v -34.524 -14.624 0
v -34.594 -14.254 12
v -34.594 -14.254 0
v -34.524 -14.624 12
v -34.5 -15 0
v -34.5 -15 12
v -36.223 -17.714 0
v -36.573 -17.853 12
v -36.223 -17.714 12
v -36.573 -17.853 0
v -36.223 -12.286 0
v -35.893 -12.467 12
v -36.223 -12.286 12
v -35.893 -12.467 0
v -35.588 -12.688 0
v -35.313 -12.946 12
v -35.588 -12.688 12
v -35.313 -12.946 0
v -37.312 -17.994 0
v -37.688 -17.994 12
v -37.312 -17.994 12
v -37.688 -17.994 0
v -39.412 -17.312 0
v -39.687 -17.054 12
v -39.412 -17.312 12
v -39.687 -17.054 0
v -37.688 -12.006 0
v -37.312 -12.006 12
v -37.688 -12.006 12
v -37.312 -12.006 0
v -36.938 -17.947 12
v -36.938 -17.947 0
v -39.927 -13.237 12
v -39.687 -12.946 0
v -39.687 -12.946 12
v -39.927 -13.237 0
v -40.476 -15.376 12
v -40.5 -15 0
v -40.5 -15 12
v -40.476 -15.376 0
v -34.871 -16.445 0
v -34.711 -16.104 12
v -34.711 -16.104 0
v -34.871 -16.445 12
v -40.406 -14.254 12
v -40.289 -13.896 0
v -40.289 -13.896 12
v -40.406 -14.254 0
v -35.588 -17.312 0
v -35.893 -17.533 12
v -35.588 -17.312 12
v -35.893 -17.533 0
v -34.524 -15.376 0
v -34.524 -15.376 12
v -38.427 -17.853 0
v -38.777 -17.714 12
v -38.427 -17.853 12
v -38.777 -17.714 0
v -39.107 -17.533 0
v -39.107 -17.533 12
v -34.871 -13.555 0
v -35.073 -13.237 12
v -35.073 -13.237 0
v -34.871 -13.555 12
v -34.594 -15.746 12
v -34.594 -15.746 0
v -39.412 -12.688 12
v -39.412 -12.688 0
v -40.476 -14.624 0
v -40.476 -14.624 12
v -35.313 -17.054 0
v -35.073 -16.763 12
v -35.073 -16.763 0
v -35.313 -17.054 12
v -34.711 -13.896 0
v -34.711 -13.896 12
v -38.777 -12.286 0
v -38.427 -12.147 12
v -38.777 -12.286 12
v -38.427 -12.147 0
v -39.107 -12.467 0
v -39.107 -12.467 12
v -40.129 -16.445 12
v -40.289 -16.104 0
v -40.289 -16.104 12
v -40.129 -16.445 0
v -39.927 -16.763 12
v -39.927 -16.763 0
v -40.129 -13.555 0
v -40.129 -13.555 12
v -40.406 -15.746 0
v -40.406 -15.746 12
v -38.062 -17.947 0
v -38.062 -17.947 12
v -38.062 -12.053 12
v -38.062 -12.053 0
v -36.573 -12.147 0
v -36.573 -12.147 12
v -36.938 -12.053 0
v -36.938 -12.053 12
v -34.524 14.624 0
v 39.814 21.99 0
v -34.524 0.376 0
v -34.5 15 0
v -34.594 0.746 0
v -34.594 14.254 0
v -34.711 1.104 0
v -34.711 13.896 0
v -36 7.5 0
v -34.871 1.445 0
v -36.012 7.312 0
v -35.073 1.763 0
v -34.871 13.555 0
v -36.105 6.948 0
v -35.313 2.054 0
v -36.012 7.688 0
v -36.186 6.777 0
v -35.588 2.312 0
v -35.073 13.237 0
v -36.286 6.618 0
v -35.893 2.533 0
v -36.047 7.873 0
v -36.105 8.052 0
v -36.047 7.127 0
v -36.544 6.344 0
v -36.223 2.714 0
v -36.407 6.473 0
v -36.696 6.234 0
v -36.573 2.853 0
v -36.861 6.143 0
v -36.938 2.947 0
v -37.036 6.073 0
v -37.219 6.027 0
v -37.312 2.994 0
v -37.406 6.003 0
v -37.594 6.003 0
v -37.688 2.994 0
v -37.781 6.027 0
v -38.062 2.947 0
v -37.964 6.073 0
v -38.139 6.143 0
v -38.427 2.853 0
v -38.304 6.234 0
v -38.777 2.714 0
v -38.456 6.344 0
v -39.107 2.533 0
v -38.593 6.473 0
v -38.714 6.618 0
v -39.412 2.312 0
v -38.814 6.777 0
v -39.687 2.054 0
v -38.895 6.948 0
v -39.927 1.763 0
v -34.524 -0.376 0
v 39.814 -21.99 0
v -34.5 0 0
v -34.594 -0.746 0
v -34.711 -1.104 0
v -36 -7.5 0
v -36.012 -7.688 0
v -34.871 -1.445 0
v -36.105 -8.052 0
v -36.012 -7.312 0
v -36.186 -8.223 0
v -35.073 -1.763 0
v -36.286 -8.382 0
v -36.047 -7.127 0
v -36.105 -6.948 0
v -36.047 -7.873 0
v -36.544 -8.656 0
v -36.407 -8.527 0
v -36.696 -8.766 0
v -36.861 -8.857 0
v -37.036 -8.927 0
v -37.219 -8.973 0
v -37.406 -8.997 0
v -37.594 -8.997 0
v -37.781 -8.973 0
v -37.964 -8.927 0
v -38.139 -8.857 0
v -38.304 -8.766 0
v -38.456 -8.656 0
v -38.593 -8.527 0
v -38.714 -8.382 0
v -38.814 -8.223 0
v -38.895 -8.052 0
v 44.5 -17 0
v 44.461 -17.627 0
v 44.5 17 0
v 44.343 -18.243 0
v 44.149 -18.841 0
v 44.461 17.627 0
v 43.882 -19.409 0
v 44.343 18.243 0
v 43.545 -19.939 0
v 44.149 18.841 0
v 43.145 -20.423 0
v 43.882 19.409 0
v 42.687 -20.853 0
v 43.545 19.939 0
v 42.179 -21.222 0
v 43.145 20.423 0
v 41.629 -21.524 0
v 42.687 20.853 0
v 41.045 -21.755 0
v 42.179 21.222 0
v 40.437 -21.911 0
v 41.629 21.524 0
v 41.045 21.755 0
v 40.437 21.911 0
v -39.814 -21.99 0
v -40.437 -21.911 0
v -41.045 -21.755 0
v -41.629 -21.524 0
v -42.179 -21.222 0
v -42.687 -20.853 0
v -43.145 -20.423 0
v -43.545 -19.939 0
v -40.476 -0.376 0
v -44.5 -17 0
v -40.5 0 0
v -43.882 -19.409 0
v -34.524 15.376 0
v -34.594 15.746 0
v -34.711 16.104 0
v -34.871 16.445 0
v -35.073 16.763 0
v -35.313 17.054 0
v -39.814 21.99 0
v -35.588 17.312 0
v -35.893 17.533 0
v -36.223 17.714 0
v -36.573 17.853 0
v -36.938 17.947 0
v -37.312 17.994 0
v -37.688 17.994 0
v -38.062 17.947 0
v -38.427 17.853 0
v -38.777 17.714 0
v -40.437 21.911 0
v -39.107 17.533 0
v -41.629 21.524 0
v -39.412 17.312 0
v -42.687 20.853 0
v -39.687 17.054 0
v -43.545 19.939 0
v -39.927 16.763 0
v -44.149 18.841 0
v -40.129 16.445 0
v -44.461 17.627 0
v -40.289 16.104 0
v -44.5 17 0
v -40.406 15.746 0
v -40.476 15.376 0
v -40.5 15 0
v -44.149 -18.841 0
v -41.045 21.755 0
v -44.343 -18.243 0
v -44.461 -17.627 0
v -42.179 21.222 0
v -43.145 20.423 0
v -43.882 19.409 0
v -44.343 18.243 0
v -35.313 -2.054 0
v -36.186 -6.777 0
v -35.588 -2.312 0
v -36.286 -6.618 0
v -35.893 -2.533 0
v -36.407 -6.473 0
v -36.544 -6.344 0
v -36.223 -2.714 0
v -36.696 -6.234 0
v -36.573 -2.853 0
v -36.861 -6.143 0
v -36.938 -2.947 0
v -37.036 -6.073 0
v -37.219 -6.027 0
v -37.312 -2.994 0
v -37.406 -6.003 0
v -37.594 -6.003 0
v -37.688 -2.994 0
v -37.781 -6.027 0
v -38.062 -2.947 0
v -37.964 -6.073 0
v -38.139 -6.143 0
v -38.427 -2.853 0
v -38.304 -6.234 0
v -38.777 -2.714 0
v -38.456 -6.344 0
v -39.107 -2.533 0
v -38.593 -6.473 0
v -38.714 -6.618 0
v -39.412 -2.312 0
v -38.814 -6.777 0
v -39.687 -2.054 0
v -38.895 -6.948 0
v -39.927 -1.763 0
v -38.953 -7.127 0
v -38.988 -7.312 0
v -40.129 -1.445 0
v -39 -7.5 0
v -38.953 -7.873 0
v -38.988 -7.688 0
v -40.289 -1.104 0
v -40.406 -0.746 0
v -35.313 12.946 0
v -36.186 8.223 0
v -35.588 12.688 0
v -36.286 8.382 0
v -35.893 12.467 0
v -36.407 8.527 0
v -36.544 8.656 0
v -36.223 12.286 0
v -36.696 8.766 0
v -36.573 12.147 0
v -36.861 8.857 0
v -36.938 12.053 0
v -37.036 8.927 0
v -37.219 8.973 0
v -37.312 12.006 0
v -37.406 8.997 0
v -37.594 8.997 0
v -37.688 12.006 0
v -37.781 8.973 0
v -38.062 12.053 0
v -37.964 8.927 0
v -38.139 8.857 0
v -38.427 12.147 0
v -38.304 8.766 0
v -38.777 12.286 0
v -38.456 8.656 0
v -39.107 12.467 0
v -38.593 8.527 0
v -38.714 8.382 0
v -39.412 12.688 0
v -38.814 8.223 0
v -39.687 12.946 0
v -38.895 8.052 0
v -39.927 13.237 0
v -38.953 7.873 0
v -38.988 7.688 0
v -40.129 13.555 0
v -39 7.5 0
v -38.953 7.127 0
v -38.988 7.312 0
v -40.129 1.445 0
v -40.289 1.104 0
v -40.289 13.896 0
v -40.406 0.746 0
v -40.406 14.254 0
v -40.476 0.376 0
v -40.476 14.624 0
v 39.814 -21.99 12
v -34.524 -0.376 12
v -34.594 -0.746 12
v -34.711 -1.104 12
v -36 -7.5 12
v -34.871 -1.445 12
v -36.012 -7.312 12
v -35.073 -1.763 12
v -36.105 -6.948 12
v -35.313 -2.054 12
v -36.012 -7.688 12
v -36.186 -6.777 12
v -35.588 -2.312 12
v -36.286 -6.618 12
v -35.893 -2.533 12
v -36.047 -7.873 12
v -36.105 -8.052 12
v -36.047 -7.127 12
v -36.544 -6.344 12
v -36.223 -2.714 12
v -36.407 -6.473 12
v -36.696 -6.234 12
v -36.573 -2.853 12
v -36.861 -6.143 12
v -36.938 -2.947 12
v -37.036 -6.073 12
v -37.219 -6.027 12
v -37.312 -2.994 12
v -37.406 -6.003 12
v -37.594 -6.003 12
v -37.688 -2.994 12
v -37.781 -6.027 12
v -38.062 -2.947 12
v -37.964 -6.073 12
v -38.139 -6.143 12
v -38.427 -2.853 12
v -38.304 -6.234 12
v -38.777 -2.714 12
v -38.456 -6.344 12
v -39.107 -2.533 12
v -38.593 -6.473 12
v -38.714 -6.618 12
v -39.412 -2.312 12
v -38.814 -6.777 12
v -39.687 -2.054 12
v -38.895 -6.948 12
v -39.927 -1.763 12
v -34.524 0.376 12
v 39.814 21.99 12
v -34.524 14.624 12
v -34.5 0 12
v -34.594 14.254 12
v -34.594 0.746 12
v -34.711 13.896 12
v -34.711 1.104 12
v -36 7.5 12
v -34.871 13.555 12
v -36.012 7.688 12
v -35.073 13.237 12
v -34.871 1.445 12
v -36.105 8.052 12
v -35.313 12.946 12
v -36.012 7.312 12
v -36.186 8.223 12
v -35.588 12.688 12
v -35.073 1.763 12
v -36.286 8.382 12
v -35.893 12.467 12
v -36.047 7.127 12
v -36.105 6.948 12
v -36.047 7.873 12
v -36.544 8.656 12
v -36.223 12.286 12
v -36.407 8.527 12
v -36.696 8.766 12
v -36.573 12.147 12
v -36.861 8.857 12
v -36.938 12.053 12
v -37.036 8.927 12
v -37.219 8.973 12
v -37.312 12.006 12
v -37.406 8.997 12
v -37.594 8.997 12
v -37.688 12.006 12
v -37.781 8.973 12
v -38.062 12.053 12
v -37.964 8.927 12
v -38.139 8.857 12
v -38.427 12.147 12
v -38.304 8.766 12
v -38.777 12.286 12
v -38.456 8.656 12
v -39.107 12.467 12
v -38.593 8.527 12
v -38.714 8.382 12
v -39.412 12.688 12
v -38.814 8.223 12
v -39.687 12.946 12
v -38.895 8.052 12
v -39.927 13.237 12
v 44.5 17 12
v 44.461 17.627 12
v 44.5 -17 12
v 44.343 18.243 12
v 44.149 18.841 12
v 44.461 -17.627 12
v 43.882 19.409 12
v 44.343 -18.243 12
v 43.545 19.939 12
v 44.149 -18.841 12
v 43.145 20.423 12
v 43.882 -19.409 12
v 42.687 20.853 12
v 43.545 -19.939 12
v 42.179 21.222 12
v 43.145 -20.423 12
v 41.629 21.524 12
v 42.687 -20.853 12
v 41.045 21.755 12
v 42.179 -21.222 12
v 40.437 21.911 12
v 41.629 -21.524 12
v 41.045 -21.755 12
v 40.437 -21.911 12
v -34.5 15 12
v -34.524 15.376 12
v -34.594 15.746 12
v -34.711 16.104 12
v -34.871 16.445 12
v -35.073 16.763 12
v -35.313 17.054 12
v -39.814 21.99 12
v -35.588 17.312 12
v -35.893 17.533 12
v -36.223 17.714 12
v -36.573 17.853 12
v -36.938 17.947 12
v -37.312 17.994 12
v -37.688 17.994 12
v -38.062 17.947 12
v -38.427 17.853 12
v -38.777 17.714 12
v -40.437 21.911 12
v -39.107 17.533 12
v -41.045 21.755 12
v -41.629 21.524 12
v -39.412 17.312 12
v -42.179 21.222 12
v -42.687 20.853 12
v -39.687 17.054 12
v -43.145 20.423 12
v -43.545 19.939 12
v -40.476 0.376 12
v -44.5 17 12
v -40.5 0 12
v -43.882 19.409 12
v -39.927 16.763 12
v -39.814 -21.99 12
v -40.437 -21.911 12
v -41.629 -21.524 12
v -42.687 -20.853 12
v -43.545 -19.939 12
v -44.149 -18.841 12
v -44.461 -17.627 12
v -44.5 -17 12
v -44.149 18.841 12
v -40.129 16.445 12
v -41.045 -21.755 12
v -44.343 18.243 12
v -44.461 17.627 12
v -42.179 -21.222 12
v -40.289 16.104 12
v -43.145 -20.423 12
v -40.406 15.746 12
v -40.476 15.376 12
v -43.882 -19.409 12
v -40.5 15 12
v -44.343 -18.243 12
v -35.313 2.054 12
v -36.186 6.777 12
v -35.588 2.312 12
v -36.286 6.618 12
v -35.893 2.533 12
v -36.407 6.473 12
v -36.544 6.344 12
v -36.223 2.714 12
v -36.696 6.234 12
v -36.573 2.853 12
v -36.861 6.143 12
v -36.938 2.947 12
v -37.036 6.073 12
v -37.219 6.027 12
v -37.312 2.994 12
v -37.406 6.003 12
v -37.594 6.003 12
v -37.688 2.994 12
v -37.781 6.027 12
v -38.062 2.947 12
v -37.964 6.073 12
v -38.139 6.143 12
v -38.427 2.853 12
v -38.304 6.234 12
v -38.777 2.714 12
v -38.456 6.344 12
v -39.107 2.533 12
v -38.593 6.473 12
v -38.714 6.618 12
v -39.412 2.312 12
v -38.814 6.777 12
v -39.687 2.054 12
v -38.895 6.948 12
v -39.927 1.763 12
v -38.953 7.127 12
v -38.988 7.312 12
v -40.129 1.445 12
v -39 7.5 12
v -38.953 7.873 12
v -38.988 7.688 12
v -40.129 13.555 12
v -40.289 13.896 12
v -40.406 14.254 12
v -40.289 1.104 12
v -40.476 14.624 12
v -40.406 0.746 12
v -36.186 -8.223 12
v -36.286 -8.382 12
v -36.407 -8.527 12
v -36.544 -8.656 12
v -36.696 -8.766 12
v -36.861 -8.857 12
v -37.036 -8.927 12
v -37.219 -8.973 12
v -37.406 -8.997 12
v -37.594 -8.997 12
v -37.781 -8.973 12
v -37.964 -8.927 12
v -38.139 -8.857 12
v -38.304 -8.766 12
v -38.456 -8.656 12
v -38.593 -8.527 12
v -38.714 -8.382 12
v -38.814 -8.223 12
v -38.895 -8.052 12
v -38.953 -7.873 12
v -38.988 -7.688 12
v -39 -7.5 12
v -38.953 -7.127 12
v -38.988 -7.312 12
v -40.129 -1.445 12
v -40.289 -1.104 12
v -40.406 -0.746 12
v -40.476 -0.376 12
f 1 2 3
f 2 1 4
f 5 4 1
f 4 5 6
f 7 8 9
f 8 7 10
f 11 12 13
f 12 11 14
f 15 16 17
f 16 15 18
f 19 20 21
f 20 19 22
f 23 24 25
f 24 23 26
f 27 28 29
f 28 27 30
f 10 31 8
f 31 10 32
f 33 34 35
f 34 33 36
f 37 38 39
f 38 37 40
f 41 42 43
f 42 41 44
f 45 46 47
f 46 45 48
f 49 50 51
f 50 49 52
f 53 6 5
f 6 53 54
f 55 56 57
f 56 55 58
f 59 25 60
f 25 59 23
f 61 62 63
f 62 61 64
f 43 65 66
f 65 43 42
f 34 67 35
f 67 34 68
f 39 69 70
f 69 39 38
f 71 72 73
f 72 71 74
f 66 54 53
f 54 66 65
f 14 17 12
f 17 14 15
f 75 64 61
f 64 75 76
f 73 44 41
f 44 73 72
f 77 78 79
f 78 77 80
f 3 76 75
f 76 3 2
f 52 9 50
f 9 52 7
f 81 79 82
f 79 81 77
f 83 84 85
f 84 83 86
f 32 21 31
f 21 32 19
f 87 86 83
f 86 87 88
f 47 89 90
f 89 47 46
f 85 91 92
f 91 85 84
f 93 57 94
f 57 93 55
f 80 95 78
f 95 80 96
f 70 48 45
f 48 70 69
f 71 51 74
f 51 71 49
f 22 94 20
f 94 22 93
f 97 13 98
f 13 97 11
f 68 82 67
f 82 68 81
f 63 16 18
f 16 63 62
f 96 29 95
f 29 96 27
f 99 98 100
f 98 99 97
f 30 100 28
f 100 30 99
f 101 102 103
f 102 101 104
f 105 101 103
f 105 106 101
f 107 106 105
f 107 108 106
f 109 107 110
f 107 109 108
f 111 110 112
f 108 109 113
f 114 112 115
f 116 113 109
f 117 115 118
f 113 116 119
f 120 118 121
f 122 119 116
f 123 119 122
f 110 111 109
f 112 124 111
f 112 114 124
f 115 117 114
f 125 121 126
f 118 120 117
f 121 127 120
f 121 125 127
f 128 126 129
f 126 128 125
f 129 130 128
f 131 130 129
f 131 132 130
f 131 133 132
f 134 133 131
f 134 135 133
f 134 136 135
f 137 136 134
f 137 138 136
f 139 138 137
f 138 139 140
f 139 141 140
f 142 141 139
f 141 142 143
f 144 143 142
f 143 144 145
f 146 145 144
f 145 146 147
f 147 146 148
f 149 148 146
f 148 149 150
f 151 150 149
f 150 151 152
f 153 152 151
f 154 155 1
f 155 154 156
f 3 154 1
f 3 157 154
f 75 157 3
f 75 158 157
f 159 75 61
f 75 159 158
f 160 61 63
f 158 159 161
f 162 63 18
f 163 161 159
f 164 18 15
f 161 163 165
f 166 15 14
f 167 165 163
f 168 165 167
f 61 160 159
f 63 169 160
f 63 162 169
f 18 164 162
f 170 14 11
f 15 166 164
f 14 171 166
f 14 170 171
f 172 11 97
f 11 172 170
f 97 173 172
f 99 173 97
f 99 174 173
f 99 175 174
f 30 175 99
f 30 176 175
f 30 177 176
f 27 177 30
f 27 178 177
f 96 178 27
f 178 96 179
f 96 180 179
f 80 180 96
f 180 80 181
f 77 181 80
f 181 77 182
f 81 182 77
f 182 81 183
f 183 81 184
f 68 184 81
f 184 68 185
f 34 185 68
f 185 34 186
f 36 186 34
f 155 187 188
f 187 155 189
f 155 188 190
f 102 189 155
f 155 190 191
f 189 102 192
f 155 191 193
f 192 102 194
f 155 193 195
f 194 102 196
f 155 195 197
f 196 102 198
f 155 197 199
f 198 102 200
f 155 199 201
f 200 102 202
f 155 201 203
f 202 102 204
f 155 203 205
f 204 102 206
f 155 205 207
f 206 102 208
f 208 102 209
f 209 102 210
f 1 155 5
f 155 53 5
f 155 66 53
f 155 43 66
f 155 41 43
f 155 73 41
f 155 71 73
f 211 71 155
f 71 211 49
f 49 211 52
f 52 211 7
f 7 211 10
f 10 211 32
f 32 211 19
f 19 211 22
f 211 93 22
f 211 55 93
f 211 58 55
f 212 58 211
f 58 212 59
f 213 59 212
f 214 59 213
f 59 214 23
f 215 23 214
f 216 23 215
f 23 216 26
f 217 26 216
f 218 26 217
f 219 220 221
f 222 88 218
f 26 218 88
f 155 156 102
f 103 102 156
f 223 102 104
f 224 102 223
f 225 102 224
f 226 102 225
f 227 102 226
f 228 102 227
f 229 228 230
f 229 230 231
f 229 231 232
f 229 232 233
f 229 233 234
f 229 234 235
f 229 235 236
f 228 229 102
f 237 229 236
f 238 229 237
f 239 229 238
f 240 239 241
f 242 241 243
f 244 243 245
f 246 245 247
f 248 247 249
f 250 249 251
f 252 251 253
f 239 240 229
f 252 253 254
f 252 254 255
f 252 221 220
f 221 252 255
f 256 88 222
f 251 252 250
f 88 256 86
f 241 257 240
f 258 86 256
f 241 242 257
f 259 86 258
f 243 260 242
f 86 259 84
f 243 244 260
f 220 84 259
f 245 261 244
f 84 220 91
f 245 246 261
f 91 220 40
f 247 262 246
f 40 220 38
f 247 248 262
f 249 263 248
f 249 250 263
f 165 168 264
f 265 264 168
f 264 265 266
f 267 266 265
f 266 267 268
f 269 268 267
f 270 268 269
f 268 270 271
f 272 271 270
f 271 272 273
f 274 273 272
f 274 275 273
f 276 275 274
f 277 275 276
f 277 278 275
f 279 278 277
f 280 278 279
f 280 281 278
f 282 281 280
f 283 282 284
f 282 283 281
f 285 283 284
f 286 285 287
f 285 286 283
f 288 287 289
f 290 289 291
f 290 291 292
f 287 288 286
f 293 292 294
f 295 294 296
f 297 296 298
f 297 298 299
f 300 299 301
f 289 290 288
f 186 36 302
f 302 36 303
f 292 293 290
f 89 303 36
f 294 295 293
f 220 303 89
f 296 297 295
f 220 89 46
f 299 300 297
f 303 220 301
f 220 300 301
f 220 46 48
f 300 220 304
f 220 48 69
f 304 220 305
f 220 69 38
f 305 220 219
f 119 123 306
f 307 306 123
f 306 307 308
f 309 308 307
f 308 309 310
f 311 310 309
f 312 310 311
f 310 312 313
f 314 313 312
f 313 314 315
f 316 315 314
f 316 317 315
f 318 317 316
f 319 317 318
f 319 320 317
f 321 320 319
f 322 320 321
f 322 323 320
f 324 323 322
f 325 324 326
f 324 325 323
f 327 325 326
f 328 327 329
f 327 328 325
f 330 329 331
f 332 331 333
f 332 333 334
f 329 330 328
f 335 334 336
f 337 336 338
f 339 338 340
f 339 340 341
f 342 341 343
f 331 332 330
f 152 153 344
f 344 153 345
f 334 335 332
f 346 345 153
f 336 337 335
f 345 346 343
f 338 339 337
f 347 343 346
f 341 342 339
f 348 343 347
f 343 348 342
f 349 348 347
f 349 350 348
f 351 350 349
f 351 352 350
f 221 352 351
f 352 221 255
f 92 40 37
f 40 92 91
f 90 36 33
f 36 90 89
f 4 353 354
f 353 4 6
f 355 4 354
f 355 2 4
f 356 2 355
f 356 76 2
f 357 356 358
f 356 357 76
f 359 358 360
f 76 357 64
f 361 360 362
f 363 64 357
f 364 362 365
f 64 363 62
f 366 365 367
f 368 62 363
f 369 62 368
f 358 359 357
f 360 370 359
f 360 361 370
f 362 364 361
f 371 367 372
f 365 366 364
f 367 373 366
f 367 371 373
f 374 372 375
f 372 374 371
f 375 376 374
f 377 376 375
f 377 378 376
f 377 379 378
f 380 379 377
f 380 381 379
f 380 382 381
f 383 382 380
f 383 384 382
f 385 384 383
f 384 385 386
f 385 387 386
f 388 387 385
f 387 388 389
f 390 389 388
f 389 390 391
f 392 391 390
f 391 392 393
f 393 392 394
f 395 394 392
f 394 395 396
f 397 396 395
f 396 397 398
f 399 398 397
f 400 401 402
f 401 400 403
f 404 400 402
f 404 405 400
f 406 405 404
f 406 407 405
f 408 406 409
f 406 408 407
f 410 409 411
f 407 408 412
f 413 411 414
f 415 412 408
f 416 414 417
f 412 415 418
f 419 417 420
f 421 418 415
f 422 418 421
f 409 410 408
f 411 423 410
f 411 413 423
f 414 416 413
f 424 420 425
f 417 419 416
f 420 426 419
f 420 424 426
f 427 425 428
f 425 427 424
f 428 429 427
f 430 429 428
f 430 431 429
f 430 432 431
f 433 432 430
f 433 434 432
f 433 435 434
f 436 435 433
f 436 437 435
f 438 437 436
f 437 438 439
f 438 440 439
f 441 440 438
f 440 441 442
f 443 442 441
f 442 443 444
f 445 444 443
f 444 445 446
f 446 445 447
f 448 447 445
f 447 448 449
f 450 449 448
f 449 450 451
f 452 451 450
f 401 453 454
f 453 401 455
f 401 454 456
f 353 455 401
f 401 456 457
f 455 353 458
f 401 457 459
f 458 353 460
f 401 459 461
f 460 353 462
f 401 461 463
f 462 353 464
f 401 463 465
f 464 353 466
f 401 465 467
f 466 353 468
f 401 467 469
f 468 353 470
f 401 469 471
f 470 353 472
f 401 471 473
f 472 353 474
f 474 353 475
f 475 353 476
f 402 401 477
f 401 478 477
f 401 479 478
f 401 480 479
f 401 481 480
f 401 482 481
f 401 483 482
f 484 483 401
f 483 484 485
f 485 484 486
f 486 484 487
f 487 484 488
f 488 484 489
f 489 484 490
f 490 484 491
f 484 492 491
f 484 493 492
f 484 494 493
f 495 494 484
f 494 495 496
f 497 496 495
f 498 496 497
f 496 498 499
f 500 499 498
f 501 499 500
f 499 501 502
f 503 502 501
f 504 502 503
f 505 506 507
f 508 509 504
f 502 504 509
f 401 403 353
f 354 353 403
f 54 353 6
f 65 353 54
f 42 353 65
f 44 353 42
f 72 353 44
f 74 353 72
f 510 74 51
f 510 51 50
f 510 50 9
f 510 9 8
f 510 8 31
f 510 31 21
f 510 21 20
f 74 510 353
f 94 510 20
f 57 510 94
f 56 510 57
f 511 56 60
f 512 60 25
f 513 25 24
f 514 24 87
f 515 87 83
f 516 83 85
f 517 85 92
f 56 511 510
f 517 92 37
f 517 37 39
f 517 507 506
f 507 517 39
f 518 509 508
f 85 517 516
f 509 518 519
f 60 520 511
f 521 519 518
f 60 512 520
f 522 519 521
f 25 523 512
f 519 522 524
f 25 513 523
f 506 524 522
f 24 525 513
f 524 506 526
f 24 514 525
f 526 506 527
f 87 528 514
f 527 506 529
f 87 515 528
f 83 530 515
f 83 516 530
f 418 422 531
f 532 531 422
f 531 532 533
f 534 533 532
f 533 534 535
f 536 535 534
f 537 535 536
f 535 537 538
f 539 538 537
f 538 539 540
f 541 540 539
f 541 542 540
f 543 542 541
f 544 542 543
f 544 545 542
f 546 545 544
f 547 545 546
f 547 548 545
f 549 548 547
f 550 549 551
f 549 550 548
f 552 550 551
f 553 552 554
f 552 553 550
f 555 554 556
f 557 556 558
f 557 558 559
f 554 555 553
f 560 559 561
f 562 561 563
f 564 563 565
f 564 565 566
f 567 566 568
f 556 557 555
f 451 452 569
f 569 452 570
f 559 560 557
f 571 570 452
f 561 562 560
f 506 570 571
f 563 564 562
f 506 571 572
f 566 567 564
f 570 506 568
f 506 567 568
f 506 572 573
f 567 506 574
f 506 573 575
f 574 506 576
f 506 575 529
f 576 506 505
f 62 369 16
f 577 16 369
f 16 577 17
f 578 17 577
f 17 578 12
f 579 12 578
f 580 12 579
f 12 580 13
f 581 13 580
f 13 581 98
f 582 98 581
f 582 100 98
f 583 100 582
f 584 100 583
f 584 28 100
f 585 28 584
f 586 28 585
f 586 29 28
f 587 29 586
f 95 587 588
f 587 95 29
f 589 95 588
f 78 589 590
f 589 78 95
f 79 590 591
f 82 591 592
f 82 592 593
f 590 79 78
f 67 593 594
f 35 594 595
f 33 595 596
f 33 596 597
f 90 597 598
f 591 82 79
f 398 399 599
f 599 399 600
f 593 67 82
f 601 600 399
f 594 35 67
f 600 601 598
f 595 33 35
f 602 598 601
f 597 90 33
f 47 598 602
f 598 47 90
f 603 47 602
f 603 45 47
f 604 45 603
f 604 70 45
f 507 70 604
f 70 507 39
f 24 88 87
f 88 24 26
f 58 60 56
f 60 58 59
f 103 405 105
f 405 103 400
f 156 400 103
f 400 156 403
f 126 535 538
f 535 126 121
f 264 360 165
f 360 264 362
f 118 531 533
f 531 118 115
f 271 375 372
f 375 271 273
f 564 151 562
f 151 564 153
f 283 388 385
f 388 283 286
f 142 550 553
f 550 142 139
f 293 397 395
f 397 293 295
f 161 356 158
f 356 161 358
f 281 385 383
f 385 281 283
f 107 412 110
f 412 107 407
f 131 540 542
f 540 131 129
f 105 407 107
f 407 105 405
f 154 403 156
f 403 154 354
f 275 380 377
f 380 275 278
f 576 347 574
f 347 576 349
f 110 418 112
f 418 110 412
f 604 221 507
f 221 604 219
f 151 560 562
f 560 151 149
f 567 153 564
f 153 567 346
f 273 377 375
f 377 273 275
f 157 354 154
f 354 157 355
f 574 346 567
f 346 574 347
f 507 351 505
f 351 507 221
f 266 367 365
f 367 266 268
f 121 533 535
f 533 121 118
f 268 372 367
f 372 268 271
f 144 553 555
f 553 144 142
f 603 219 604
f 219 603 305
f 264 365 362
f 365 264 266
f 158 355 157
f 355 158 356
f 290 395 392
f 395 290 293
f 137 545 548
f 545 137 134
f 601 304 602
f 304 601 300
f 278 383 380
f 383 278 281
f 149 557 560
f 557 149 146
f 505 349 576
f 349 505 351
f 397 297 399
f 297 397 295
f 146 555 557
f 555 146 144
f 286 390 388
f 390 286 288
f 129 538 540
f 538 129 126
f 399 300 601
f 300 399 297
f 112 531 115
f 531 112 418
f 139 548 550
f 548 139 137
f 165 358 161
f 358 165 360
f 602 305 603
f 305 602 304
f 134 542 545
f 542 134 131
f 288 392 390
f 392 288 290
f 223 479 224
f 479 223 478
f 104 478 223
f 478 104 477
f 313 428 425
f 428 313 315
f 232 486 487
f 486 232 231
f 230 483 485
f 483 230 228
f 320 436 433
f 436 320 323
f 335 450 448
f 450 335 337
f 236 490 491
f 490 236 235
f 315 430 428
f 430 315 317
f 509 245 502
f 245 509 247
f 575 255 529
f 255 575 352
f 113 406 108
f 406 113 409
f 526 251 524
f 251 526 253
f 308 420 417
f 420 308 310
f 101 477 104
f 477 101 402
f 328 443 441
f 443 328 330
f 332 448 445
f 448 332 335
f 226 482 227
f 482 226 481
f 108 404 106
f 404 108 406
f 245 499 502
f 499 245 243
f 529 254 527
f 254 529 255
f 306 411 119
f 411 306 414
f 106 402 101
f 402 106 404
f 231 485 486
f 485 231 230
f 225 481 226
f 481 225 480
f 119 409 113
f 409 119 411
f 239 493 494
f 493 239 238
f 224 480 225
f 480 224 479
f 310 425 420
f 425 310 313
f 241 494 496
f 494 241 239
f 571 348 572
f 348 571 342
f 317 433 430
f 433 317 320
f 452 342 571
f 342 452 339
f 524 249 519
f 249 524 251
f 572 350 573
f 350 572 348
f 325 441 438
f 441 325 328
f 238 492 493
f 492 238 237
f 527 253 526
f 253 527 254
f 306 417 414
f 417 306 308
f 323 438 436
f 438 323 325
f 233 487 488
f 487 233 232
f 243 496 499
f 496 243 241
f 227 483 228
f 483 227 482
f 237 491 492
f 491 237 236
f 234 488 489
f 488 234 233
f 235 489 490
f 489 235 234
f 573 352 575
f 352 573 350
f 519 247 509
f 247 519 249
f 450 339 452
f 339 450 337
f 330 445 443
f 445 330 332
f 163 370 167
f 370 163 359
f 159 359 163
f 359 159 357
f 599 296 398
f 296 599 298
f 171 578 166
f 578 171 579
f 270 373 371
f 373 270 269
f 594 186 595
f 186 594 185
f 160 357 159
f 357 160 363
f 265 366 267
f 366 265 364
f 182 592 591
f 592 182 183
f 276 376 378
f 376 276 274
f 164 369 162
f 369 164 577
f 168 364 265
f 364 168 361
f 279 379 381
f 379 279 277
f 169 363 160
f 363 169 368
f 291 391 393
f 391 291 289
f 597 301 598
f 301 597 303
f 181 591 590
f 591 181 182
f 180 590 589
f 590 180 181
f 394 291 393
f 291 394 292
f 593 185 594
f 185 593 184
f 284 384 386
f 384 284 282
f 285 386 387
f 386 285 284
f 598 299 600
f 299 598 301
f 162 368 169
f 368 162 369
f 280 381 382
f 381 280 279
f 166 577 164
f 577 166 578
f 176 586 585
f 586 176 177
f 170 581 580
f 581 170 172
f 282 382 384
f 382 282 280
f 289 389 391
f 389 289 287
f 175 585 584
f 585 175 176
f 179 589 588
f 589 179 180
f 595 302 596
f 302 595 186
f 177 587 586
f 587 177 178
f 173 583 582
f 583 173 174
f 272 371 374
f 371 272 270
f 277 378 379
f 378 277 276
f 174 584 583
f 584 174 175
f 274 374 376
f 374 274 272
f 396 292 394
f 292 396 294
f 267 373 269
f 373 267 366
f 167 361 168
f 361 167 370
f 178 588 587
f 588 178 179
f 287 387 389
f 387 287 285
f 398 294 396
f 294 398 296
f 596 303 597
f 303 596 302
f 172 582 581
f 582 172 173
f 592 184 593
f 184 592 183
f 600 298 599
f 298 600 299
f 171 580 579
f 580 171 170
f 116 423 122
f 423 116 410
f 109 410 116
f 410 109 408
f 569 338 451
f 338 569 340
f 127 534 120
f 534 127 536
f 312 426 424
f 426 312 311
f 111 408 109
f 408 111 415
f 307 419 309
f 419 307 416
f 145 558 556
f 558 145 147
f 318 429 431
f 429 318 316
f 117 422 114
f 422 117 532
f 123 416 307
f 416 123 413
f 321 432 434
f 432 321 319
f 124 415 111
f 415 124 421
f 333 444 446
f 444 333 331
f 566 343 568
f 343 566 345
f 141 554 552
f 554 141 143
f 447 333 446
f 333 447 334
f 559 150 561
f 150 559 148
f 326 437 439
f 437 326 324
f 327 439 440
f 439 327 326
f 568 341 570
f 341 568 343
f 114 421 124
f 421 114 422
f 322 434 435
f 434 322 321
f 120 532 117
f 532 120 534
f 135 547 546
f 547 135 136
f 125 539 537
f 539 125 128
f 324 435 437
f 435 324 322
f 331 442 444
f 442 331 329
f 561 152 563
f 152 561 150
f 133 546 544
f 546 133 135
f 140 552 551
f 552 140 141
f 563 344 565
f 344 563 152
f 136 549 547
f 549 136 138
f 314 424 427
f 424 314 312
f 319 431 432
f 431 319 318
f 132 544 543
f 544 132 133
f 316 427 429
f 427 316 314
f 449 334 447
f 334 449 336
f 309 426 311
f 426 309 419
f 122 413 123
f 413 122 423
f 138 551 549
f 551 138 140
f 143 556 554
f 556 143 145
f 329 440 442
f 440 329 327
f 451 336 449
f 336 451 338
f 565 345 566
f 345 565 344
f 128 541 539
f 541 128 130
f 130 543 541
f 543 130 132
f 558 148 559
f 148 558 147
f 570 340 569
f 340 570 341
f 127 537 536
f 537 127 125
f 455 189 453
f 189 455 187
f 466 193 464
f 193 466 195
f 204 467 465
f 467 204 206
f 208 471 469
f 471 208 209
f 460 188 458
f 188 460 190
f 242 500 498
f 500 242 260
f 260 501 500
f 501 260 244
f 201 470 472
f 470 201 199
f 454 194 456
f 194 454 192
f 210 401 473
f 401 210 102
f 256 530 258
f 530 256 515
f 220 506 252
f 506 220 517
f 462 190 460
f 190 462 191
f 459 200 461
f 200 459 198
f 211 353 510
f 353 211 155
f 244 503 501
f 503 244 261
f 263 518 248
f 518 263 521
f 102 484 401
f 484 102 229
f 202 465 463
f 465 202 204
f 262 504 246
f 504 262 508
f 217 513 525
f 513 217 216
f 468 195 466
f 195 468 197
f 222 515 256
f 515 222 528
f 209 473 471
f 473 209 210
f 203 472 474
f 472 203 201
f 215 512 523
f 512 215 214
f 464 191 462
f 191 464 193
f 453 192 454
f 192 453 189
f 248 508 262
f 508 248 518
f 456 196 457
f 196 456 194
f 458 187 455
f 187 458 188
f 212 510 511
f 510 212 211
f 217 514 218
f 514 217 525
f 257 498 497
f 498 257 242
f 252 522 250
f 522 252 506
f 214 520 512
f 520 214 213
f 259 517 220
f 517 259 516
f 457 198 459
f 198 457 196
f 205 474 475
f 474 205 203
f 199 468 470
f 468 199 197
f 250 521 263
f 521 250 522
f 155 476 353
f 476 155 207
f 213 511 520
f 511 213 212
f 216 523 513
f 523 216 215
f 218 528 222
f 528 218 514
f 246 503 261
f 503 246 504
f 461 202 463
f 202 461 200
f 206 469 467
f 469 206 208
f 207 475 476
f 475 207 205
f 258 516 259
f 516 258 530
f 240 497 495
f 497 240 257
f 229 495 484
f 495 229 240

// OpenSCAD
$fn = 50;


difference() {
	union() {
		hull() {
			translate(v = [-39.5000000000, 17.0000000000, 0]) {
				cylinder(h = 12, r = 5);
			}
			translate(v = [39.5000000000, 17.0000000000, 0]) {
				cylinder(h = 12, r = 5);
			}
			translate(v = [-39.5000000000, -17.0000000000, 0]) {
				cylinder(h = 12, r = 5);
			}
			translate(v = [39.5000000000, -17.0000000000, 0]) {
				cylinder(h = 12, r = 5);
			}
		}
	}
	union() {
		translate(v = [-37.5000000000, -15.0000000000, 0]) {
			cylinder(h = 12, r = 3.0000000000);
		}
		translate(v = [-37.5000000000, 0.0000000000, 0]) {
			cylinder(h = 12, r = 3.0000000000);
		}
		translate(v = [-37.5000000000, 15.0000000000, 0]) {
			cylinder(h = 12, r = 3.0000000000);
		}
		translate(v = [-37.5000000000, -15.0000000000, 0]) {
			cylinder(h = 12, r = 1.5000000000);
		}
		translate(v = [-37.5000000000, -7.5000000000, 0]) {
			cylinder(h = 12, r = 1.5000000000);
		}
		translate(v = [-37.5000000000, 0.0000000000, 0]) {
			cylinder(h = 12, r = 1.5000000000);
		}
		translate(v = [-37.5000000000, 7.5000000000, 0]) {
			cylinder(h = 12, r = 1.5000000000);
		}
		translate(v = [-37.5000000000, 15.0000000000, 0]) {
			cylinder(h = 12, r = 1.5000000000);
		}
		translate(v = [-37.5000000000, -15.0000000000, 0]) {
			cylinder(h = 12, r = 1.5000000000);
		}
		translate(v = [-37.5000000000, -7.5000000000, 0]) {
			cylinder(h = 12, r = 1.5000000000);
		}
		translate(v = [-37.5000000000, 0.0000000000, 0]) {
			cylinder(h = 12, r = 1.5000000000);
		}
		translate(v = [-37.5000000000, 7.5000000000, 0]) {
			cylinder(h = 12, r = 1.5000000000);
		}
		translate(v = [-37.5000000000, 15.0000000000, 0]) {
			cylinder(h = 12, r = 1.5000000000);
		}
		translate(v = [-37.5000000000, -15.0000000000, 0]) {
			cylinder(h = 12, r = 1.5000000000);
		}
		translate(v = [-37.5000000000, -7.5000000000, 0]) {
			cylinder(h = 12, r = 1.5000000000);
		}
		translate(v = [-37.5000000000, 0.0000000000, 0]) {
			cylinder(h = 12, r = 1.5000000000);
		}
		translate(v = [-37.5000000000, 7.5000000000, 0]) {
			cylinder(h = 12, r = 1.5000000000);
		}
		translate(v = [-37.5000000000, 15.0000000000, 0]) {
			cylinder(h = 12, r = 1.5000000000);
		}
	}
}
